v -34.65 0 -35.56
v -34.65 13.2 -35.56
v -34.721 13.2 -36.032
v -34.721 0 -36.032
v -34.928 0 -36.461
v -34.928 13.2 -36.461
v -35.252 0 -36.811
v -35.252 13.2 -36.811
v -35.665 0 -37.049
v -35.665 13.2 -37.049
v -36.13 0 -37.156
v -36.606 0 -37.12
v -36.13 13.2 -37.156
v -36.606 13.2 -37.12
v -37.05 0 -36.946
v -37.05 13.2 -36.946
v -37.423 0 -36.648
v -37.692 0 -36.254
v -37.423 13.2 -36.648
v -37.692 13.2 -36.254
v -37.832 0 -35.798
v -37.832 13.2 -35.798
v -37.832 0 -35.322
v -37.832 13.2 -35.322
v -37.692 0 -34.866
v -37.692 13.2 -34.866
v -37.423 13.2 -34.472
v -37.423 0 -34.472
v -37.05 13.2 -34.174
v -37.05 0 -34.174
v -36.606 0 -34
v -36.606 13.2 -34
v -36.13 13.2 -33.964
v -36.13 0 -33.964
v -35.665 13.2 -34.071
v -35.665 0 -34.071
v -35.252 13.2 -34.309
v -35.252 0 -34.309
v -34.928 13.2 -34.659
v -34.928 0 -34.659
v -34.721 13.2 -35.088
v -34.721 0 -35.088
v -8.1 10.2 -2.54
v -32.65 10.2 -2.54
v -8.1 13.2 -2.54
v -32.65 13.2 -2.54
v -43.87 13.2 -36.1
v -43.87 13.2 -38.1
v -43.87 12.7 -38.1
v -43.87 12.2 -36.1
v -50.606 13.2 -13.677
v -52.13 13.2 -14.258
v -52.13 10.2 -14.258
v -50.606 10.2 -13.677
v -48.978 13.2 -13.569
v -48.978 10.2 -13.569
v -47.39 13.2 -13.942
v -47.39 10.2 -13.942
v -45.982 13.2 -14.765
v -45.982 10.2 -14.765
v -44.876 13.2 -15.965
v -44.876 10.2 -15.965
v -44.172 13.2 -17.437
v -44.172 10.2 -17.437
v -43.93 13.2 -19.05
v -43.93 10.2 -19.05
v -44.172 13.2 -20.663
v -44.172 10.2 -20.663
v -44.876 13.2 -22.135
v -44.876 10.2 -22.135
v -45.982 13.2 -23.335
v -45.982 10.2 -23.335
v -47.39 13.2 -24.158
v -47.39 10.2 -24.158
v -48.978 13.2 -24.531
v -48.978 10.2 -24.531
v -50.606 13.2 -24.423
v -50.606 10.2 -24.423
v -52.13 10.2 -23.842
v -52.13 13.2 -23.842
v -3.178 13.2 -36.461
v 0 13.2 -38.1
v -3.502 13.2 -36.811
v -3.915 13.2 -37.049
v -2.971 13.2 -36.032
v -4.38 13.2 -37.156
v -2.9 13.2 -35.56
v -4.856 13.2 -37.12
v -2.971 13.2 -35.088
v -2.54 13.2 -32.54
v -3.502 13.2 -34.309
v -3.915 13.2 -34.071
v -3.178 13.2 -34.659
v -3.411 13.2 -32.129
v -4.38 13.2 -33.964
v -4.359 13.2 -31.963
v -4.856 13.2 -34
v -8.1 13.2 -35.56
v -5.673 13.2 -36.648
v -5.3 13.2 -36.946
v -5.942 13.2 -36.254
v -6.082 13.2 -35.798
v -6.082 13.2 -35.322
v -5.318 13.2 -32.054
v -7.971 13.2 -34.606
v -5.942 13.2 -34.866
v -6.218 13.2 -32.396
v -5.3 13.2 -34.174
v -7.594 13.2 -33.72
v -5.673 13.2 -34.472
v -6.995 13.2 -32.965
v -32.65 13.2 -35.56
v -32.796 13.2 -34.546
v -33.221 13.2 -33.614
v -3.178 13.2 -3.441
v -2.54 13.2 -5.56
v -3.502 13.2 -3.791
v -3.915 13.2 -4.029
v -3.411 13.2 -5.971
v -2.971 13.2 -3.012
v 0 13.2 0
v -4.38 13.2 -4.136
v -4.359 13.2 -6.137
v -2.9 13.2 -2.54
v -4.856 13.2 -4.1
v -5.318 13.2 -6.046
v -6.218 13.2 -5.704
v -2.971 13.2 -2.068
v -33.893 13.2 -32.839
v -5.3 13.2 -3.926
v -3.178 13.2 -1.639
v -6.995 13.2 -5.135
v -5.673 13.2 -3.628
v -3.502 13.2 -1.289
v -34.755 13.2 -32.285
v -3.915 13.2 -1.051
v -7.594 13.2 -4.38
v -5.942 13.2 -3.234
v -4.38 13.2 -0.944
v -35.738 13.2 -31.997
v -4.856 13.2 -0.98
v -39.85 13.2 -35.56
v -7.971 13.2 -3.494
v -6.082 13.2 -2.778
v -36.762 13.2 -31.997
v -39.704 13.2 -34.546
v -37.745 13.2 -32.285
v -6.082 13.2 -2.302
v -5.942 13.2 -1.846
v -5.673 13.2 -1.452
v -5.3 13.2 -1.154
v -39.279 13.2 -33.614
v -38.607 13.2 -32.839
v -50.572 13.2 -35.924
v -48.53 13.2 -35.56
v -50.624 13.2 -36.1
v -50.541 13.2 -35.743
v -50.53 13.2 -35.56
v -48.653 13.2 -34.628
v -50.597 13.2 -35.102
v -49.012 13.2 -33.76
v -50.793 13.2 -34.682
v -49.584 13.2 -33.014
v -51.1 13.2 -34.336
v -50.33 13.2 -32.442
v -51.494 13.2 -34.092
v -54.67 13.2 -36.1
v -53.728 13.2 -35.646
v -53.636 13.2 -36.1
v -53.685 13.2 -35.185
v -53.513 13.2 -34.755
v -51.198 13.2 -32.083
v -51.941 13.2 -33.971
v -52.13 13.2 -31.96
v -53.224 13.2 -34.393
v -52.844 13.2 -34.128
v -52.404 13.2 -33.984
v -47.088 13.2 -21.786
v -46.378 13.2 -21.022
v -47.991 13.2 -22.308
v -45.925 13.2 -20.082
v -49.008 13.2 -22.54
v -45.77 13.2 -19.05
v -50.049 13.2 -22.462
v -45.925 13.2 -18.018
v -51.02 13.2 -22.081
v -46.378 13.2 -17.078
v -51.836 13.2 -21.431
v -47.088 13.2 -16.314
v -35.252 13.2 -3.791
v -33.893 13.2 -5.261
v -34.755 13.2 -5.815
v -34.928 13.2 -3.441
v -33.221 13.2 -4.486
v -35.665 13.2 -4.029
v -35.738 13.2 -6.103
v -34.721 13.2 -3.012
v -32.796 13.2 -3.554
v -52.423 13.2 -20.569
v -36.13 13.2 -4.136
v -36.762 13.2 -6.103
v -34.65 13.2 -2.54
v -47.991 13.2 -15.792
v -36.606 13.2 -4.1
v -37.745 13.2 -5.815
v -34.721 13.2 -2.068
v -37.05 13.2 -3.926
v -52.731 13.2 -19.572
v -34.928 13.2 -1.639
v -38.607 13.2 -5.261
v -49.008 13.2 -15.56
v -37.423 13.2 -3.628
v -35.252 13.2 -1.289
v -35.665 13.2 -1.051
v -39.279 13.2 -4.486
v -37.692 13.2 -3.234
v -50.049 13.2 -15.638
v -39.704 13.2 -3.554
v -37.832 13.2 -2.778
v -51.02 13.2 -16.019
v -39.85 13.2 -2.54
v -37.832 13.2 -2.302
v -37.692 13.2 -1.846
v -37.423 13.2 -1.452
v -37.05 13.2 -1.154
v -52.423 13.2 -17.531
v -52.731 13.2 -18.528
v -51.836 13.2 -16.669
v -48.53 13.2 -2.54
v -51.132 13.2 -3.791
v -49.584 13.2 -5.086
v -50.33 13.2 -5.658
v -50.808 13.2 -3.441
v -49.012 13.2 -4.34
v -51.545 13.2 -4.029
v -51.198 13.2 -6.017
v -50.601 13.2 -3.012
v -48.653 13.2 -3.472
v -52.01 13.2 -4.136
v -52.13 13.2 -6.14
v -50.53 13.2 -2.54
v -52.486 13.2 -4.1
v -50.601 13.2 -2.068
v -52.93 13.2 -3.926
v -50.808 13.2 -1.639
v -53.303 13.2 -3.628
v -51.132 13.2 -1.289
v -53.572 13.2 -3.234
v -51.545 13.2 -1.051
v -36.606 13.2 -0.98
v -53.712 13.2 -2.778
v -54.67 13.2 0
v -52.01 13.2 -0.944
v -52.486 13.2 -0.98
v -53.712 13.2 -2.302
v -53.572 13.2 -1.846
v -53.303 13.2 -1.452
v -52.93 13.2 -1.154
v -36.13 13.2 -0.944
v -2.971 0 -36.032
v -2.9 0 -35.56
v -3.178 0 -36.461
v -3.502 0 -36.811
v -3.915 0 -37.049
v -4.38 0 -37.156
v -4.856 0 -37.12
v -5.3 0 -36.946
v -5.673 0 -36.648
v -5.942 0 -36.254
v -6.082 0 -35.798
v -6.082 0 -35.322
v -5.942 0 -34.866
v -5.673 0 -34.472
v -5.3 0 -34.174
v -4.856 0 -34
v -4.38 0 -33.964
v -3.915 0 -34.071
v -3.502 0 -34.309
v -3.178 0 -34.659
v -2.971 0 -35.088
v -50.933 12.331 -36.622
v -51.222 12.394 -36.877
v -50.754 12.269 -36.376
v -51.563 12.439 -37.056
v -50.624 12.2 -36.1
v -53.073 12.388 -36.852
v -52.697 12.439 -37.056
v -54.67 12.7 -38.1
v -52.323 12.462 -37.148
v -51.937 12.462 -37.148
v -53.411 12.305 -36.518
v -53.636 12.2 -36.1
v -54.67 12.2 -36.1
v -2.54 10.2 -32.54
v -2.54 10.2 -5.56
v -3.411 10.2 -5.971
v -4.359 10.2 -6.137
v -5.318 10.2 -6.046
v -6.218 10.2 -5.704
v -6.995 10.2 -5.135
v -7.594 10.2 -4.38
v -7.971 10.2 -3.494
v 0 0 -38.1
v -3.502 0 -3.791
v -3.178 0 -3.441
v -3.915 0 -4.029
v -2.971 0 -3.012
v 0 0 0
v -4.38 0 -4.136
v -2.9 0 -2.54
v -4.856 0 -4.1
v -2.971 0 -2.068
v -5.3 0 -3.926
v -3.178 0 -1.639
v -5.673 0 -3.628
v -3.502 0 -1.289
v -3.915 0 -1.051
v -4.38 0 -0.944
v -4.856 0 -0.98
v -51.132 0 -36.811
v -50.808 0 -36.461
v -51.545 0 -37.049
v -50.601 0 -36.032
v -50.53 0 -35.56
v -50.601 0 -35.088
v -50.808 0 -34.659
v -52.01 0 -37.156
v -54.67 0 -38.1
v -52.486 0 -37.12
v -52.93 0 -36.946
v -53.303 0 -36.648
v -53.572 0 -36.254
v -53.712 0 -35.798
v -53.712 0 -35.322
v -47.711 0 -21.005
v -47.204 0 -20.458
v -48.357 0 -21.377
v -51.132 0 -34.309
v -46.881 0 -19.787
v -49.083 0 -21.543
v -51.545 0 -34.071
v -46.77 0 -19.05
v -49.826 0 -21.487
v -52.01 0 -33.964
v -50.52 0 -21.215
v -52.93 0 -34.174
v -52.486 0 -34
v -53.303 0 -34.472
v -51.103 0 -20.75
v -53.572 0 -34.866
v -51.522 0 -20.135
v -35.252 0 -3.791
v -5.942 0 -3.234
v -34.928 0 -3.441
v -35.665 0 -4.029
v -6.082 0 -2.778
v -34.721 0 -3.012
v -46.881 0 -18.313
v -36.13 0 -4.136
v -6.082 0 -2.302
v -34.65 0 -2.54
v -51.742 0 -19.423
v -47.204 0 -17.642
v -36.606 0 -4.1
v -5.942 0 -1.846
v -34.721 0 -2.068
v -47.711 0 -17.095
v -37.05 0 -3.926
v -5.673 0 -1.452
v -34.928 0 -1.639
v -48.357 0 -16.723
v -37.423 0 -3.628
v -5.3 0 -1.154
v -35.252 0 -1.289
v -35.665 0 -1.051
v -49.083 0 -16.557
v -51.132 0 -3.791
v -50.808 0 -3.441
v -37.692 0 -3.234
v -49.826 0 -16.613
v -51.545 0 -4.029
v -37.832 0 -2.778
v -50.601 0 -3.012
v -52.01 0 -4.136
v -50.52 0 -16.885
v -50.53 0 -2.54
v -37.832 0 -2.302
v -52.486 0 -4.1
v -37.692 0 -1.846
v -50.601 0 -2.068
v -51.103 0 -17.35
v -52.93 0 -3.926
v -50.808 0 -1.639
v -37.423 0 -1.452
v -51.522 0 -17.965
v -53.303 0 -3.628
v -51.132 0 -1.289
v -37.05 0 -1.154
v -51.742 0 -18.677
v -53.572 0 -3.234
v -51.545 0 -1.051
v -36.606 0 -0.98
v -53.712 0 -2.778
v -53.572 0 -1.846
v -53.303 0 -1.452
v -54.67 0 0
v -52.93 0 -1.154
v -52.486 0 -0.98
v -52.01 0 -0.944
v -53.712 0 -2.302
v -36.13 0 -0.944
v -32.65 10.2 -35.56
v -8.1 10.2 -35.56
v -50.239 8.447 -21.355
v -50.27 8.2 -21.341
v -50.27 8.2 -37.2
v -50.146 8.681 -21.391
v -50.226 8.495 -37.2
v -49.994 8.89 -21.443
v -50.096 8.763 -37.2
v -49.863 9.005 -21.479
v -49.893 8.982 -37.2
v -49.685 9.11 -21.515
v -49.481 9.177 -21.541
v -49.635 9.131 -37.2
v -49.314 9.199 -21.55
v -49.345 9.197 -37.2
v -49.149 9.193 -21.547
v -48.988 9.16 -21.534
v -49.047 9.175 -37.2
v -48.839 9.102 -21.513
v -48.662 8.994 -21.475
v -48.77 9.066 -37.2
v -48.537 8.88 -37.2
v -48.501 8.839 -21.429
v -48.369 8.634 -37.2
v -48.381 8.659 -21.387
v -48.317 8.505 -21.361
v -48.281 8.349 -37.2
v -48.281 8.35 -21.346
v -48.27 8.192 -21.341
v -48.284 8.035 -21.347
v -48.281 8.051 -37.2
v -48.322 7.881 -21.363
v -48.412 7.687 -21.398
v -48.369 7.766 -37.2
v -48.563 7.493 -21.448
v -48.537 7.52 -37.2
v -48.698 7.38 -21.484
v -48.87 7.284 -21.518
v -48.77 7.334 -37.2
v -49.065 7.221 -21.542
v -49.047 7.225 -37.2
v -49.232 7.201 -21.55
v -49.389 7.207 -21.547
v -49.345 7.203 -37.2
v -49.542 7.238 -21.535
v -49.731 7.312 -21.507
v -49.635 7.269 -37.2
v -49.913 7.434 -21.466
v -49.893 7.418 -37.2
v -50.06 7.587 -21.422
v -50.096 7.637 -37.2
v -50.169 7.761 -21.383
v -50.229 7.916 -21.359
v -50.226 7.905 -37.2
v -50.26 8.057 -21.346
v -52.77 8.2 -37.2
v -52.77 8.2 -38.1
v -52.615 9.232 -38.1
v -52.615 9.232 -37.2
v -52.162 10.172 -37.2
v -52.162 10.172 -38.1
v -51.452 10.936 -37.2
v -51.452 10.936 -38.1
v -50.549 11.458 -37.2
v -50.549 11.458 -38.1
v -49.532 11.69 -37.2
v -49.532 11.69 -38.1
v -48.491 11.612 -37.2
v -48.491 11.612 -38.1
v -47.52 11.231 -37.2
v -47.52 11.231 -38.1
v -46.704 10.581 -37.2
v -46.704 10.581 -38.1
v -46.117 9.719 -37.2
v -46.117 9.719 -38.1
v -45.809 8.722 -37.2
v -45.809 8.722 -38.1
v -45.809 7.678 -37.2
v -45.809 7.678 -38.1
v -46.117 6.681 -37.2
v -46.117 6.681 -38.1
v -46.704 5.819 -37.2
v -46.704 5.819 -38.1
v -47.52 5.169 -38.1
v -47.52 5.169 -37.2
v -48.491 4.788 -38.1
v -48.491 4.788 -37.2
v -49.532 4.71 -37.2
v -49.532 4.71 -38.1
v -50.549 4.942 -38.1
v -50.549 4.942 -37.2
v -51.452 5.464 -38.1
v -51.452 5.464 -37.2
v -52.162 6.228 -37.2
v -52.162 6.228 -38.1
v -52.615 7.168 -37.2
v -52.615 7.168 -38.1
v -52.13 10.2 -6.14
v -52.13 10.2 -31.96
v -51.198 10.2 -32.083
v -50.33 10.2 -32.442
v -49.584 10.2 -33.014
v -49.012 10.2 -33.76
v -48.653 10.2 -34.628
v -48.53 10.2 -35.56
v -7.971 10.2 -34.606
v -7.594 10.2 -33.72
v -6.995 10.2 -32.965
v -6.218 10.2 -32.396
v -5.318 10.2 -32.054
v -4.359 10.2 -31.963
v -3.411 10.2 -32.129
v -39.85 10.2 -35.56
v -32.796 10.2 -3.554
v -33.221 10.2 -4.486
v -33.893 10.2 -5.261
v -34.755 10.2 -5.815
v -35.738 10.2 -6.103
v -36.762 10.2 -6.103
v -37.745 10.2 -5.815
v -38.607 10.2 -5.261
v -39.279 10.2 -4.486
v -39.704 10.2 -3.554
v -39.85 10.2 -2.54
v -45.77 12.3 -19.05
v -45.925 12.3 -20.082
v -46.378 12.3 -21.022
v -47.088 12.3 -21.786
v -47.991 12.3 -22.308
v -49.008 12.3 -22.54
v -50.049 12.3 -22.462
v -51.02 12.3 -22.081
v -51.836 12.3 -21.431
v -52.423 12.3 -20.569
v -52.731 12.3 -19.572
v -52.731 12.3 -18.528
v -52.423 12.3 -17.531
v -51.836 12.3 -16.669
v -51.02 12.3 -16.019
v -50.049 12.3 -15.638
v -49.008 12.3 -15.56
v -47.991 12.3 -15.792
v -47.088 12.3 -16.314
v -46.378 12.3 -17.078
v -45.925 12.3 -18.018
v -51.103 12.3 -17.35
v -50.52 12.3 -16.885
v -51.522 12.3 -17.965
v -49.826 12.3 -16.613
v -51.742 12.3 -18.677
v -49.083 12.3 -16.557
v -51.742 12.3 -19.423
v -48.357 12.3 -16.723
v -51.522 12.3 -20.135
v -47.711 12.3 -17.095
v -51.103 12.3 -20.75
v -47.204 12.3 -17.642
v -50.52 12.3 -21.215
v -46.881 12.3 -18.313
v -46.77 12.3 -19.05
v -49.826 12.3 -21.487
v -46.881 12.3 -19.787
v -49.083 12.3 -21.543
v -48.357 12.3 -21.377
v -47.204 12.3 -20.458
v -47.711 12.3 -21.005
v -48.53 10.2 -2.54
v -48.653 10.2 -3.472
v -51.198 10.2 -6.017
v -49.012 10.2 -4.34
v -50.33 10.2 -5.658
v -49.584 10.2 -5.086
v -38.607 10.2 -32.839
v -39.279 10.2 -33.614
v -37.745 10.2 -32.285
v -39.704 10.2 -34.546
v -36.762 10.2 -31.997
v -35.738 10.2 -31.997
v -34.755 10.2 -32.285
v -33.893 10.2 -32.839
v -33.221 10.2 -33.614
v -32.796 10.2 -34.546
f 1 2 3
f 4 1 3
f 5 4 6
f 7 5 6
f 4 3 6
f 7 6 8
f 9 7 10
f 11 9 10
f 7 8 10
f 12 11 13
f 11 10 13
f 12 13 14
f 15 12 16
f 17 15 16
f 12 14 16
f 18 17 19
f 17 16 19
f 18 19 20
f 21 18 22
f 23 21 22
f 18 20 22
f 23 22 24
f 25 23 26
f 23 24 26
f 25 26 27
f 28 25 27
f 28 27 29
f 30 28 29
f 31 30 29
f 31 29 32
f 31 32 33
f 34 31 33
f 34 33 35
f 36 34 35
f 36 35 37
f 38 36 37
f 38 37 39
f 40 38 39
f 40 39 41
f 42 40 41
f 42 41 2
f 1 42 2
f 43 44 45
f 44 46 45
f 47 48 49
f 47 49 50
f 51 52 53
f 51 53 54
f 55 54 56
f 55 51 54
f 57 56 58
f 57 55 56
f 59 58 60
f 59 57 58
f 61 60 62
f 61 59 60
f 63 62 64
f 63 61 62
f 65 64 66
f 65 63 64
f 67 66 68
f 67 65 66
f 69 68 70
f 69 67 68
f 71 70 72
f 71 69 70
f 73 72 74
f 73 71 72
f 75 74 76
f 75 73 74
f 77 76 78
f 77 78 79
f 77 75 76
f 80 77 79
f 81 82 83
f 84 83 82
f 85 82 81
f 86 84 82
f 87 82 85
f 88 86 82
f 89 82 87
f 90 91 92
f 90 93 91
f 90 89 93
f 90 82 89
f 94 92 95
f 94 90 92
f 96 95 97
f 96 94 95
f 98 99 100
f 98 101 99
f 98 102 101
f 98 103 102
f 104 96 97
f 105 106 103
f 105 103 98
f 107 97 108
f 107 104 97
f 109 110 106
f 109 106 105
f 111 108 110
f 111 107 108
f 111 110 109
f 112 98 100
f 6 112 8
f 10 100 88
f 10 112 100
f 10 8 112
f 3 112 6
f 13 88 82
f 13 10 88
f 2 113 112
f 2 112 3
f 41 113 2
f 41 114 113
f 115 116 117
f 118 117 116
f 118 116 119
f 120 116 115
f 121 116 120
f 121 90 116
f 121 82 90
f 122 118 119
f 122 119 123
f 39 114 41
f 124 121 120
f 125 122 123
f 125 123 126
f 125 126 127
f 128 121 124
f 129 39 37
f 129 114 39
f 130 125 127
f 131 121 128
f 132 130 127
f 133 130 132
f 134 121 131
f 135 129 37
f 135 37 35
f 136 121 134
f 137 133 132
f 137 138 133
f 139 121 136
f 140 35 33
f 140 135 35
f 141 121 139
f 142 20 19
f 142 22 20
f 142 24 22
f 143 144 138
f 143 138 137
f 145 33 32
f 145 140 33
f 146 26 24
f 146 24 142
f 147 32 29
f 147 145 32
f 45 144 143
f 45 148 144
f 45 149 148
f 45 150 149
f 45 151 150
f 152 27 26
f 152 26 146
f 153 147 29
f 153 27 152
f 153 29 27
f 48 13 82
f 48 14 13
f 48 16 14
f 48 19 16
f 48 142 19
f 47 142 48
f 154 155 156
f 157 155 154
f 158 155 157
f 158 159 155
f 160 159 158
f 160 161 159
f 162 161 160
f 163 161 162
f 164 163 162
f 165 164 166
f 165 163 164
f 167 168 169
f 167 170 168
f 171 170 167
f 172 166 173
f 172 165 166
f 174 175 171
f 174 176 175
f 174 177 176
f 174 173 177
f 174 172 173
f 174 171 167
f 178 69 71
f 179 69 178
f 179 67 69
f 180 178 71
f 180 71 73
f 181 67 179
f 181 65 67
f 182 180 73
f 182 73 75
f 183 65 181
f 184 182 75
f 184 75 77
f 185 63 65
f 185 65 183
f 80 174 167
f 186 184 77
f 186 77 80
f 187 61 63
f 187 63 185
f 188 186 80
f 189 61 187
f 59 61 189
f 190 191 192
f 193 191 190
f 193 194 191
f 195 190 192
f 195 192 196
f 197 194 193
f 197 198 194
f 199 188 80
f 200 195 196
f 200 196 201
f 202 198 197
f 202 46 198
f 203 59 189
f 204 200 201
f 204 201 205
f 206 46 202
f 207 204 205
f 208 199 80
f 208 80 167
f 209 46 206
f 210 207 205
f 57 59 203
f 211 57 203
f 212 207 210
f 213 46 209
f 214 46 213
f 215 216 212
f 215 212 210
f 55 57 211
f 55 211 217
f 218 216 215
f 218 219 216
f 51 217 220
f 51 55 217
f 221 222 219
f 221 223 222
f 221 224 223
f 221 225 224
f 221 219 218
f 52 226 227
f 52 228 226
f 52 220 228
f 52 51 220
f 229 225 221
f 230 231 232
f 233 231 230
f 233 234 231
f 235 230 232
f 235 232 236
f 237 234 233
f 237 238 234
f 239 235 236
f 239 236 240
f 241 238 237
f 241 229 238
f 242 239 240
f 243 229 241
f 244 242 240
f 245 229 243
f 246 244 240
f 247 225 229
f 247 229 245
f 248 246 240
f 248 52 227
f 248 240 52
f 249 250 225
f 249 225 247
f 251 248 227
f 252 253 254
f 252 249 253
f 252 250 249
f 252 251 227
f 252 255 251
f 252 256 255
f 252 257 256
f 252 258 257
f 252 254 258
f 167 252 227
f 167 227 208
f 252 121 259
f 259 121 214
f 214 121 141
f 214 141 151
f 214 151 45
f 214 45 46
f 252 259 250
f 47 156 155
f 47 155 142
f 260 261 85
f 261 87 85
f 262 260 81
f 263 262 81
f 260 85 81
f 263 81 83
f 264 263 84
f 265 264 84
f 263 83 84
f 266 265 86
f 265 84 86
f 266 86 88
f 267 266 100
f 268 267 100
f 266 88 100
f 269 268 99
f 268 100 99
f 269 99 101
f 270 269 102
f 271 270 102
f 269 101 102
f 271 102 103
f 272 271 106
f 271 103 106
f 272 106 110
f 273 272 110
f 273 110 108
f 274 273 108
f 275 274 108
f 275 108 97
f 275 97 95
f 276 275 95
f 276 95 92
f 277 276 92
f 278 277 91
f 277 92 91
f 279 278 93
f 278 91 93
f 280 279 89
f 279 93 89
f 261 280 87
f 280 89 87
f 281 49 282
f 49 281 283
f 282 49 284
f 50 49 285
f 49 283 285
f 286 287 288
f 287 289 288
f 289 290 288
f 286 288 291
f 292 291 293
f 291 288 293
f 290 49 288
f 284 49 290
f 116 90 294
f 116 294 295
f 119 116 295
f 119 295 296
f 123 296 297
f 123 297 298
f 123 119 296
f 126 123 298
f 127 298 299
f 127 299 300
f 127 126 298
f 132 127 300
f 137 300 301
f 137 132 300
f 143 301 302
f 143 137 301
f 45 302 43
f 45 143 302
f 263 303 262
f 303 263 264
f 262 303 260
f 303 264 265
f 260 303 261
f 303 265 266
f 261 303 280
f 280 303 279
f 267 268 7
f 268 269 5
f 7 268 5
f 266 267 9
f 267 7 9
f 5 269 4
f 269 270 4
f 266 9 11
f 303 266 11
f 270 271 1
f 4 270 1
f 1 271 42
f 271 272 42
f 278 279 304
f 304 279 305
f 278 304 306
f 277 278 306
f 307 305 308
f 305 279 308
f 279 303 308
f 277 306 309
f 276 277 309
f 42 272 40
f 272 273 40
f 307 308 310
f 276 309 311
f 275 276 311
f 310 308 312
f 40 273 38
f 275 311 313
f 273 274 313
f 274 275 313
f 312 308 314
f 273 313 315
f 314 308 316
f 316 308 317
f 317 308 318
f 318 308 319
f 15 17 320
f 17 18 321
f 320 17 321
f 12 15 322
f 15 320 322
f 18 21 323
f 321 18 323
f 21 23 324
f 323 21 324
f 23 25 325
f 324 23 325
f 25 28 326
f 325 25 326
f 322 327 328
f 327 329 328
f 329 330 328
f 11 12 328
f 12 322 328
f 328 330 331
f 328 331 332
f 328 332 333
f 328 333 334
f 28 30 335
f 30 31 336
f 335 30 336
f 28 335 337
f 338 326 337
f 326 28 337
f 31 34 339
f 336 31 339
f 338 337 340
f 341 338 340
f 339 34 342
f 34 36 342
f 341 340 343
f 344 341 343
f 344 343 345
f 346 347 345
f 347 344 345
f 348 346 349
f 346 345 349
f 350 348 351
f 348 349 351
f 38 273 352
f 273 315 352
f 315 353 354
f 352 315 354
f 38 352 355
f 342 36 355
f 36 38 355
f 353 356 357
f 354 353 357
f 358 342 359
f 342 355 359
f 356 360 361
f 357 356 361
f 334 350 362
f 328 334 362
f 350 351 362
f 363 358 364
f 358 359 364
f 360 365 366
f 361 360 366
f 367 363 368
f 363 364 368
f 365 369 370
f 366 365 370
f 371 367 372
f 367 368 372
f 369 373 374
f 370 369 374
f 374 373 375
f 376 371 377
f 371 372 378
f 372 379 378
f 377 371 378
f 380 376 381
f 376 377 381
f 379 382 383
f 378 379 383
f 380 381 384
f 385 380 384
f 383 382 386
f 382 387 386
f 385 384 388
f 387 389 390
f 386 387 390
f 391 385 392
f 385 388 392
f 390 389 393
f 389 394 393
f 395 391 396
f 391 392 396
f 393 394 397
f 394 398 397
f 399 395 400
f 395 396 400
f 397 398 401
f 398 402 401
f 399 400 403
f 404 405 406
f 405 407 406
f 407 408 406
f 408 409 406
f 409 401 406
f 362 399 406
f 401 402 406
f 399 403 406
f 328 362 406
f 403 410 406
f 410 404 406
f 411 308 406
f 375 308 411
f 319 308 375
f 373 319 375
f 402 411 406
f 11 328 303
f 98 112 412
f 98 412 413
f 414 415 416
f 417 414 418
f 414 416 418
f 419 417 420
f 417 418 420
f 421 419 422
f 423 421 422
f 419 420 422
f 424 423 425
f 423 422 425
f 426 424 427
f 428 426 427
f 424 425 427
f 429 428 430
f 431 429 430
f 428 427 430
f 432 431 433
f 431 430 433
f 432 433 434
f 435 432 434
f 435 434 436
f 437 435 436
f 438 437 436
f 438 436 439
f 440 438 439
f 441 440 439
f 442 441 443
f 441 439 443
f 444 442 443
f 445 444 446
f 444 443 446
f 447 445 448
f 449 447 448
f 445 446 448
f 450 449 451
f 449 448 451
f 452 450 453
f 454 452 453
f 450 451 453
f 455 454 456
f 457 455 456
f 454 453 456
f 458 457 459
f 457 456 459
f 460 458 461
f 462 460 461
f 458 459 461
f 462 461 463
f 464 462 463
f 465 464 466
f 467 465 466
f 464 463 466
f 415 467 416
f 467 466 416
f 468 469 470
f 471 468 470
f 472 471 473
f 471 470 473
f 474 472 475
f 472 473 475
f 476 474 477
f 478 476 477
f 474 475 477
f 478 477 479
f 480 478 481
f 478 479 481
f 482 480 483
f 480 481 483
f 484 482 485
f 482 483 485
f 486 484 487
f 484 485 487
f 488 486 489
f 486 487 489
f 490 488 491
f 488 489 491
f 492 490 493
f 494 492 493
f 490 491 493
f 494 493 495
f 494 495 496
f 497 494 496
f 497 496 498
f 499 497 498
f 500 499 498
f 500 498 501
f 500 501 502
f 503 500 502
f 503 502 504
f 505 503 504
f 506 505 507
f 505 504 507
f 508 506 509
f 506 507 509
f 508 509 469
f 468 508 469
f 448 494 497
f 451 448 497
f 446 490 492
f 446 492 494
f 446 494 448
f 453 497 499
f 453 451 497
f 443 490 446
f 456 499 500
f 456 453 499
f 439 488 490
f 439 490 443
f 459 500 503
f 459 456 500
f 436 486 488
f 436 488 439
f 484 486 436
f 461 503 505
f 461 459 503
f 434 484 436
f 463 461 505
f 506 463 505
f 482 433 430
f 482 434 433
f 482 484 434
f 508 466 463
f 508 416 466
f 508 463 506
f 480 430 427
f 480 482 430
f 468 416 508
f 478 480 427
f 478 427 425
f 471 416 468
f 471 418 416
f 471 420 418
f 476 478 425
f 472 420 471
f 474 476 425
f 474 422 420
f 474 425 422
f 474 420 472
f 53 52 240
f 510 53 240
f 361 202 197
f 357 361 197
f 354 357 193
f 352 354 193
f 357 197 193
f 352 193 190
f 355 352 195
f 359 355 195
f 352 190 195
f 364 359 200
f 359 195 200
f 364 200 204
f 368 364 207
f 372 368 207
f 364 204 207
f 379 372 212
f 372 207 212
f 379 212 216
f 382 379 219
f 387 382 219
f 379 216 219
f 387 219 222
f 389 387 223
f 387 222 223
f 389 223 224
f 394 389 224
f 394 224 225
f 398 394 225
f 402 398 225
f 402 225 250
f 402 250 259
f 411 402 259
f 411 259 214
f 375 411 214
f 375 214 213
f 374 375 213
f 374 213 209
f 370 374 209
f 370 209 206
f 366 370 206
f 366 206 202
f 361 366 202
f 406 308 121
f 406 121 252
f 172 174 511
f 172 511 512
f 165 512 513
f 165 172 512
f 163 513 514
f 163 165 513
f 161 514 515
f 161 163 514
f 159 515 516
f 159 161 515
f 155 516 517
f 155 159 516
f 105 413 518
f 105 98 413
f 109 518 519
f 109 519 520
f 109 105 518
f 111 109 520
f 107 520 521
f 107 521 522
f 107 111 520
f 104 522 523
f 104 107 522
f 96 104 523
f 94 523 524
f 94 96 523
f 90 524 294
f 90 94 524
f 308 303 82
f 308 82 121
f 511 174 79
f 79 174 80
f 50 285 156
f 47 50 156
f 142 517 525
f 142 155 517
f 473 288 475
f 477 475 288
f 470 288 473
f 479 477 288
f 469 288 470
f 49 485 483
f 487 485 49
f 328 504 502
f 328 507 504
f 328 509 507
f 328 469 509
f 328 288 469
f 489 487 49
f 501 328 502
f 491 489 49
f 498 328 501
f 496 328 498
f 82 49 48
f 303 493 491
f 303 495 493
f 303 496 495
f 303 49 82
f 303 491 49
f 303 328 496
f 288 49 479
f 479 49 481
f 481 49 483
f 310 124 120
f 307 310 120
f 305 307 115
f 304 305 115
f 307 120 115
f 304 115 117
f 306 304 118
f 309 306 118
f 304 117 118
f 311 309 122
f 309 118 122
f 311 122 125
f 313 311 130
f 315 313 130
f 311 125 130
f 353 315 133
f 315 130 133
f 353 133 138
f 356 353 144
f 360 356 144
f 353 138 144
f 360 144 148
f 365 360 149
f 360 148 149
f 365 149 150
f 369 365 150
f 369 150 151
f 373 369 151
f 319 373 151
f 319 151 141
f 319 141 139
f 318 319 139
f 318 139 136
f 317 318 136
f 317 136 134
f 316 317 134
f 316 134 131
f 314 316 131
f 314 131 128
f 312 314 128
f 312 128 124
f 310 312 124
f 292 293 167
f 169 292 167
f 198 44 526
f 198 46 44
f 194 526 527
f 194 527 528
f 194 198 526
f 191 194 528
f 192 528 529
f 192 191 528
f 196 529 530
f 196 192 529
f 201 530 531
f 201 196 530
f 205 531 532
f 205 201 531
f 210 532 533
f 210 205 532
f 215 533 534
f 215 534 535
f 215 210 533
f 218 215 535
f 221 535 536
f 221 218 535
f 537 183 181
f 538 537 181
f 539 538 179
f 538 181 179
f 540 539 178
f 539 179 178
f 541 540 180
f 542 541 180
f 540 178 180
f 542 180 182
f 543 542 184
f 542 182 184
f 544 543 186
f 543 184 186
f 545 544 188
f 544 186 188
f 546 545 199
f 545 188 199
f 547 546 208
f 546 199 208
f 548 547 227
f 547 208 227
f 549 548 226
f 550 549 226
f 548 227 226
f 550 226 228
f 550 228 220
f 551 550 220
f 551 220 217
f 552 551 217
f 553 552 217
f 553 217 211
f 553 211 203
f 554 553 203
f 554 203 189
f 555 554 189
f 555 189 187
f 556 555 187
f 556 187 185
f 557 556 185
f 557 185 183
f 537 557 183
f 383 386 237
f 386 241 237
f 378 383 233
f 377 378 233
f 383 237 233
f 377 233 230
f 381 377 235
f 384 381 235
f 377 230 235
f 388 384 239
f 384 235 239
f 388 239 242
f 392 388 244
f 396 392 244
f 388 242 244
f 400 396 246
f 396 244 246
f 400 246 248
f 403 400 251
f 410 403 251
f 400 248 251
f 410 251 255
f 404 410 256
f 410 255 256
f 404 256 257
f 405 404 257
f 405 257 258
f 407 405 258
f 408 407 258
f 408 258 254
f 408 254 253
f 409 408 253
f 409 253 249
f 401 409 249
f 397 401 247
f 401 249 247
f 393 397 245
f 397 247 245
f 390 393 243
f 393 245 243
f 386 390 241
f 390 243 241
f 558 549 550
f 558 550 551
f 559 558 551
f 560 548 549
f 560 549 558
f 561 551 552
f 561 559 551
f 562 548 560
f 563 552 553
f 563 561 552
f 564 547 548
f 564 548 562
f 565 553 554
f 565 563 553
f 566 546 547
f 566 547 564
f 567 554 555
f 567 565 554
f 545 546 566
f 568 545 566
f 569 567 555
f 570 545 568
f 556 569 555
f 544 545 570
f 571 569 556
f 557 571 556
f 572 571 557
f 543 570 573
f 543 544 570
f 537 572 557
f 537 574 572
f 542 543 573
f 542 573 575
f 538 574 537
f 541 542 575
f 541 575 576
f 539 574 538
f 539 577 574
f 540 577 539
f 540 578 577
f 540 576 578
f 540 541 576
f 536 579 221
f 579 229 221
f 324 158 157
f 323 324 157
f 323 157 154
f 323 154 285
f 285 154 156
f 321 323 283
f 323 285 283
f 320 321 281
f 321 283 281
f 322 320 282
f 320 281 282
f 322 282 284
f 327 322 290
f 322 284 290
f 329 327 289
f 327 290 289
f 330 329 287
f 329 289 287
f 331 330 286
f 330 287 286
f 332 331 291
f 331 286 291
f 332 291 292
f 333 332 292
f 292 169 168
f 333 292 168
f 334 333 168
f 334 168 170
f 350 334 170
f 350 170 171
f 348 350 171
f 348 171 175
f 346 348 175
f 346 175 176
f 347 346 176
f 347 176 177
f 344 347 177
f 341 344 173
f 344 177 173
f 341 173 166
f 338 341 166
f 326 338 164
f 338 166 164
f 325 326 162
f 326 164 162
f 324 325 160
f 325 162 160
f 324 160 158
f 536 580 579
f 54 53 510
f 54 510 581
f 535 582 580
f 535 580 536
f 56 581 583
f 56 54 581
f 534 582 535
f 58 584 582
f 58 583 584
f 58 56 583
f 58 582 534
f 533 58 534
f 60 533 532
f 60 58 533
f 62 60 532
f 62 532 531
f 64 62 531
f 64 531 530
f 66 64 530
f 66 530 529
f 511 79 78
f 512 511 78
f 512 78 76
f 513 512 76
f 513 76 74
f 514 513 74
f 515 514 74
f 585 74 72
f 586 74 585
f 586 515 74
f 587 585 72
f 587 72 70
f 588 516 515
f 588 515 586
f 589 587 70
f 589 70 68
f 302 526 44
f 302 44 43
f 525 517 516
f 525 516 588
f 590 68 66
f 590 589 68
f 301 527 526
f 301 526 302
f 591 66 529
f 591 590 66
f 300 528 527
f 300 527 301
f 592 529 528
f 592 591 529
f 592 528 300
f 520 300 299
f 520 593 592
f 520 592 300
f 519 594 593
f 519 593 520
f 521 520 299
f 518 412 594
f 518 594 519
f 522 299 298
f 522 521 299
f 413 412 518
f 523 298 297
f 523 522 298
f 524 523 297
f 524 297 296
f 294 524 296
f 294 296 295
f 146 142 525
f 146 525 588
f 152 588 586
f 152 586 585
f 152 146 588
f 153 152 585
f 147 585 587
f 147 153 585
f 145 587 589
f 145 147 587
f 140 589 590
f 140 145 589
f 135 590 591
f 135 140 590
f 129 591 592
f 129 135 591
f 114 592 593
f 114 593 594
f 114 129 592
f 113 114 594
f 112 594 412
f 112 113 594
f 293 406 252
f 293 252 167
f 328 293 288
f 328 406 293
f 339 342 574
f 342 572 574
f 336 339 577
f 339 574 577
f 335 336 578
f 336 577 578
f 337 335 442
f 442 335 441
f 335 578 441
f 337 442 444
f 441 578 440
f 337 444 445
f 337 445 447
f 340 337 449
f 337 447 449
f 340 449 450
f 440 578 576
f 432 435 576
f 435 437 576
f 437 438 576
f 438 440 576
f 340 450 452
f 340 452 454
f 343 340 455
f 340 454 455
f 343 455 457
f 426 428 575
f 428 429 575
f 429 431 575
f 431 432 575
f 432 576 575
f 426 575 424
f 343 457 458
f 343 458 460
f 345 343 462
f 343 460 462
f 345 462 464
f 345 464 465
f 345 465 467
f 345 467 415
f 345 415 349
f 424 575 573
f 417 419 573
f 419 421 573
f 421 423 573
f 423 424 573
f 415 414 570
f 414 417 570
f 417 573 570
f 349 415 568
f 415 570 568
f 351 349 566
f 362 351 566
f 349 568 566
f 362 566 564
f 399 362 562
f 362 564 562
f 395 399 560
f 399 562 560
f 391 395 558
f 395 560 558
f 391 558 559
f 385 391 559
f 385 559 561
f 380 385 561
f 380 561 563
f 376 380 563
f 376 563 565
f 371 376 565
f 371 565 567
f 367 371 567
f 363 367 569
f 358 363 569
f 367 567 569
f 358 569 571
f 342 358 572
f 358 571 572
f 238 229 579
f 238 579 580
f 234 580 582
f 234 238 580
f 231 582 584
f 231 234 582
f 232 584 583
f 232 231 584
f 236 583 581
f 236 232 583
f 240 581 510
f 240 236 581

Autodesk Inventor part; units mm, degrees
ref_plane "YZ Plane" through (0, 0, 0) normal (1, 0, 0) x (0, 1, 0)
ref_plane "XZ Plane" through (0, 0, 0) normal (0, 1, 0) x (-1, 0, 0)
ref_plane "XY Plane" through (0, 0, 0) normal (0, 0, 1) x (1, 0, 0)
sketch "Sketch1" plane through (0, 0, 0) normal (0, 1, 0) x (-1, 0, 0)
  line L0 (0, 0) -> (54.67, 0)
  line L1 (54.67, 0) -> (54.67, -38.1)
  line L2 (54.67, -38.1) -> (0, -38.1)
  line L3 (0, -38.1) -> (0, 0)
  dimension "d0" = 54.67
  dimension "d1" = 38.1
extrude "Extrusion1" add sketch "Sketch1" along normal blind 13.2
sketch "Sketch2" plane through (0, 13.2, 0) normal (0, 1, 0) x (1, 0, 0)
  circle A0 centre (-52.13, 2.54) radius 1.6
  circle A1 centre (-36.25, 2.54) radius 1.6
  circle A2 centre (-4.5, 2.54) radius 1.6
  circle A3 centre (-52.13, 35.56) radius 1.6
  circle A4 centre (-36.25, 35.56) radius 1.6
  circle A5 centre (-4.5, 35.56) radius 1.6
  line L0 (-54.67, 0) -> (0, 0)
  line L1 (0, 38.1) -> (-54.67, 38.1)
  line L2 (-54.67, 38.1) -> (-54.67, 0)
  line L3 (0, 0) -> (0, 38.1)
  dimension "d4" = 3.2
  dimension "d5" = 3.2
  dimension "d6" = 3.2
  dimension "d7" = 3.2
  dimension "d8" = 3.2
  dimension "d9" = 3.2
  dimension "d10" = 2.54
  dimension "d11" = 2.54
  dimension "d12" = 2.54
  dimension "d13" = 2.54
  dimension "d14" = 2.54
  dimension "d15" = 2.54
  dimension "d16" = 2.54
  dimension "d17" = 4.5
  dimension "d18" = 36.25
  dimension "d19" = 4.5
  dimension "d20" = 36.25
  dimension "d21" = 2.54
extrude "Extrusion2" cut sketch "Sketch2" against normal through all contours A0 | A1 | A2 | A3 | A4 | A5
sketch "Sketch3" plane through (0, 13.2, 0) normal (0, 1, 0) x (1, 0, 0)
  arc A0 (-52.13, 31.96) -> (-48.53, 35.56) centre (-52.13, 35.56) ccw
  arc A1 (-39.85, 35.56) -> (-32.65, 35.56) centre (-36.25, 35.56) ccw
  arc A2 (-8.1, 35.56) -> (-2.54, 32.5403) centre (-4.5, 35.56) ccw
  arc A3 (-2.54, 5.5597) -> (-8.1, 2.54) centre (-4.5, 2.54) ccw
  arc A4 (-32.65, 2.54) -> (-39.85, 2.54) centre (-36.25, 2.54) ccw
  arc A5 (-48.53, 2.54) -> (-52.13, 6.14) centre (-52.13, 2.54) ccw
  arc A6 (-52.13, 14.2583) -> (-52.13, 23.8417) centre (-49.43, 19.05) ccw
  line L0 (-48.53, 35.56) -> (-39.85, 35.56)
  line L1 (-32.65, 35.56) -> (-8.1, 35.56)
  line L2 (-2.54, 32.5403) -> (-2.54, 5.5597)
  line L3 (-52.13, 14.2583) -> (-52.13, 6.14)
  line L4 (-48.53, 2.54) -> (-39.85, 2.54)
  line L5 (-32.65, 2.54) -> (-8.1, 2.54)
  line L6 (0, 0) -> (0, 38.1)
  line L7 (0, 38.1) -> (-54.67, 38.1)
  line L8 (-54.67, 0) -> (0, 0)
  line L9 (-54.67, 38.1) -> (-54.67, 0)
  line L10 (-52.13, 31.96) -> (-52.13, 23.8417)
  dimension "d24" = 4.5
  dimension "d25" = 2.54
  dimension "d26" = 2.54
  dimension "d27" = 4.5
  dimension "d28" = 2.54
  dimension "d29" = 36.25
  dimension "d30" = 15.88
  dimension "d31" = 36.25
  dimension "d32" = 15.88
  dimension "d33" = 2.54
  dimension "d34" = 2.54
  dimension "d35" = 2.54
  dimension "d36" = 3.6
  dimension "d37" = 3.6
  dimension "d38" = 3.6
  dimension "d39" = 3.6
  dimension "d40" = 3.6
  dimension "d41" = 3.6
  dimension "d42" = 2.54
  dimension "d43" = 2.54
  dimension "d44" = 2.54
  dimension "d45" = 2.54
  dimension "d46" = 2.54
  dimension "d47" = 2.54
  dimension "d48" = 2.54
  dimension "d49" = 5.24
  dimension "d50" = 19.05
  dimension "d51" = 5.5
extrude "Extrusion3" cut sketch "Sketch3" against normal blind 3 contours A0 L0 A1 L1 A2 L2 A3 L5 A4 L4 A5 L3 A6 L10
sketch "Sketch5" plane through (0, 13.2, 0) normal (0, 1, 0) x (1, 0, 0)
  circle A0 centre (-49.27, 19.05) radius 3.5
  line L0 (-54.67, 38.1) -> (-54.67, 0) projected
  line L1 (-54.67, 0) -> (0, 0) projected
  dimension "d61" = 7
  dimension "d62" = 5.4
  dimension "d63" = 19.05
extrude "Extrusion5" cut sketch "Sketch5" against normal blind 0.9
sketch "Sketch15" plane through (-49.27, 12.3, -19.05) normal (0, 1, 0) x (1, 0, 0)
  circle A0 centre (0, 0) radius 2.5
  line L0 (-5.4, 19.05) -> (-5.4, -19.05) projected
  line L1 (49.27, 19.05) -> (-5.4, 19.05) projected
  point P0 (49.27, -19.05)
  dimension "d116" = 5
  dimension "d117" = 5.4
  dimension "d118" = 19.05
extrude "Extrusion13" cut sketch "Sketch15" against normal through all
sketch "Sketch18" plane through (0, 0, -38.1) normal (0, 0, -1) x (-1, 0, 0)
  circle A0 centre (49.27, 8.2) radius 1
  line L0 (54.67, 0) -> (54.67, 13.2) projected
  line L1 (0, 13.2) -> (54.67, 13.2) projected
  point P0 (0, 0)
  dimension "d124" = 2
  dimension "d125" = 5.4
  dimension "d126" = 5
extrude "Extrusion14" cut sketch "Sketch18" against normal blind 19
sketch "Sketch20" plane through (-54.67, 0, -38.1) normal (-1, 0, 0) x (0, 0, 1)
  line L0 (2, 13.2) -> (0, 13.2)
  line L1 (0, 13.2) -> (0, 12.7)
  line L2 (0, 12.7) -> (2, 12.2)
  line L3 (2, 12.2) -> (2, 13.2)
  point P0 (38.1, 0)
  dimension "d129" = 0.5
  dimension "d130" = 1
  dimension "d131" = 2
extrude "Extrusion15" cut sketch "Sketch20" against normal blind 10.8
sketch "Sketch21" plane through (0, 0, -38.1) normal (0, 0, -1) x (-1, 0, 0)
  circle A0 centre (49.27, 8.2) radius 3.5
  line L0 (54.67, 0) -> (54.67, 12.7) projected
  line L1 (43.87, 13.2) -> (50.6239, 13.2) projected
  point P0 (0, 0)
  dimension "d134" = 7
  dimension "d135" = 5.4
  dimension "d136" = 5
extrude "Extrusion16" cut sketch "Sketch21" against normal blind 0.9
properties part number "HousingVX"
